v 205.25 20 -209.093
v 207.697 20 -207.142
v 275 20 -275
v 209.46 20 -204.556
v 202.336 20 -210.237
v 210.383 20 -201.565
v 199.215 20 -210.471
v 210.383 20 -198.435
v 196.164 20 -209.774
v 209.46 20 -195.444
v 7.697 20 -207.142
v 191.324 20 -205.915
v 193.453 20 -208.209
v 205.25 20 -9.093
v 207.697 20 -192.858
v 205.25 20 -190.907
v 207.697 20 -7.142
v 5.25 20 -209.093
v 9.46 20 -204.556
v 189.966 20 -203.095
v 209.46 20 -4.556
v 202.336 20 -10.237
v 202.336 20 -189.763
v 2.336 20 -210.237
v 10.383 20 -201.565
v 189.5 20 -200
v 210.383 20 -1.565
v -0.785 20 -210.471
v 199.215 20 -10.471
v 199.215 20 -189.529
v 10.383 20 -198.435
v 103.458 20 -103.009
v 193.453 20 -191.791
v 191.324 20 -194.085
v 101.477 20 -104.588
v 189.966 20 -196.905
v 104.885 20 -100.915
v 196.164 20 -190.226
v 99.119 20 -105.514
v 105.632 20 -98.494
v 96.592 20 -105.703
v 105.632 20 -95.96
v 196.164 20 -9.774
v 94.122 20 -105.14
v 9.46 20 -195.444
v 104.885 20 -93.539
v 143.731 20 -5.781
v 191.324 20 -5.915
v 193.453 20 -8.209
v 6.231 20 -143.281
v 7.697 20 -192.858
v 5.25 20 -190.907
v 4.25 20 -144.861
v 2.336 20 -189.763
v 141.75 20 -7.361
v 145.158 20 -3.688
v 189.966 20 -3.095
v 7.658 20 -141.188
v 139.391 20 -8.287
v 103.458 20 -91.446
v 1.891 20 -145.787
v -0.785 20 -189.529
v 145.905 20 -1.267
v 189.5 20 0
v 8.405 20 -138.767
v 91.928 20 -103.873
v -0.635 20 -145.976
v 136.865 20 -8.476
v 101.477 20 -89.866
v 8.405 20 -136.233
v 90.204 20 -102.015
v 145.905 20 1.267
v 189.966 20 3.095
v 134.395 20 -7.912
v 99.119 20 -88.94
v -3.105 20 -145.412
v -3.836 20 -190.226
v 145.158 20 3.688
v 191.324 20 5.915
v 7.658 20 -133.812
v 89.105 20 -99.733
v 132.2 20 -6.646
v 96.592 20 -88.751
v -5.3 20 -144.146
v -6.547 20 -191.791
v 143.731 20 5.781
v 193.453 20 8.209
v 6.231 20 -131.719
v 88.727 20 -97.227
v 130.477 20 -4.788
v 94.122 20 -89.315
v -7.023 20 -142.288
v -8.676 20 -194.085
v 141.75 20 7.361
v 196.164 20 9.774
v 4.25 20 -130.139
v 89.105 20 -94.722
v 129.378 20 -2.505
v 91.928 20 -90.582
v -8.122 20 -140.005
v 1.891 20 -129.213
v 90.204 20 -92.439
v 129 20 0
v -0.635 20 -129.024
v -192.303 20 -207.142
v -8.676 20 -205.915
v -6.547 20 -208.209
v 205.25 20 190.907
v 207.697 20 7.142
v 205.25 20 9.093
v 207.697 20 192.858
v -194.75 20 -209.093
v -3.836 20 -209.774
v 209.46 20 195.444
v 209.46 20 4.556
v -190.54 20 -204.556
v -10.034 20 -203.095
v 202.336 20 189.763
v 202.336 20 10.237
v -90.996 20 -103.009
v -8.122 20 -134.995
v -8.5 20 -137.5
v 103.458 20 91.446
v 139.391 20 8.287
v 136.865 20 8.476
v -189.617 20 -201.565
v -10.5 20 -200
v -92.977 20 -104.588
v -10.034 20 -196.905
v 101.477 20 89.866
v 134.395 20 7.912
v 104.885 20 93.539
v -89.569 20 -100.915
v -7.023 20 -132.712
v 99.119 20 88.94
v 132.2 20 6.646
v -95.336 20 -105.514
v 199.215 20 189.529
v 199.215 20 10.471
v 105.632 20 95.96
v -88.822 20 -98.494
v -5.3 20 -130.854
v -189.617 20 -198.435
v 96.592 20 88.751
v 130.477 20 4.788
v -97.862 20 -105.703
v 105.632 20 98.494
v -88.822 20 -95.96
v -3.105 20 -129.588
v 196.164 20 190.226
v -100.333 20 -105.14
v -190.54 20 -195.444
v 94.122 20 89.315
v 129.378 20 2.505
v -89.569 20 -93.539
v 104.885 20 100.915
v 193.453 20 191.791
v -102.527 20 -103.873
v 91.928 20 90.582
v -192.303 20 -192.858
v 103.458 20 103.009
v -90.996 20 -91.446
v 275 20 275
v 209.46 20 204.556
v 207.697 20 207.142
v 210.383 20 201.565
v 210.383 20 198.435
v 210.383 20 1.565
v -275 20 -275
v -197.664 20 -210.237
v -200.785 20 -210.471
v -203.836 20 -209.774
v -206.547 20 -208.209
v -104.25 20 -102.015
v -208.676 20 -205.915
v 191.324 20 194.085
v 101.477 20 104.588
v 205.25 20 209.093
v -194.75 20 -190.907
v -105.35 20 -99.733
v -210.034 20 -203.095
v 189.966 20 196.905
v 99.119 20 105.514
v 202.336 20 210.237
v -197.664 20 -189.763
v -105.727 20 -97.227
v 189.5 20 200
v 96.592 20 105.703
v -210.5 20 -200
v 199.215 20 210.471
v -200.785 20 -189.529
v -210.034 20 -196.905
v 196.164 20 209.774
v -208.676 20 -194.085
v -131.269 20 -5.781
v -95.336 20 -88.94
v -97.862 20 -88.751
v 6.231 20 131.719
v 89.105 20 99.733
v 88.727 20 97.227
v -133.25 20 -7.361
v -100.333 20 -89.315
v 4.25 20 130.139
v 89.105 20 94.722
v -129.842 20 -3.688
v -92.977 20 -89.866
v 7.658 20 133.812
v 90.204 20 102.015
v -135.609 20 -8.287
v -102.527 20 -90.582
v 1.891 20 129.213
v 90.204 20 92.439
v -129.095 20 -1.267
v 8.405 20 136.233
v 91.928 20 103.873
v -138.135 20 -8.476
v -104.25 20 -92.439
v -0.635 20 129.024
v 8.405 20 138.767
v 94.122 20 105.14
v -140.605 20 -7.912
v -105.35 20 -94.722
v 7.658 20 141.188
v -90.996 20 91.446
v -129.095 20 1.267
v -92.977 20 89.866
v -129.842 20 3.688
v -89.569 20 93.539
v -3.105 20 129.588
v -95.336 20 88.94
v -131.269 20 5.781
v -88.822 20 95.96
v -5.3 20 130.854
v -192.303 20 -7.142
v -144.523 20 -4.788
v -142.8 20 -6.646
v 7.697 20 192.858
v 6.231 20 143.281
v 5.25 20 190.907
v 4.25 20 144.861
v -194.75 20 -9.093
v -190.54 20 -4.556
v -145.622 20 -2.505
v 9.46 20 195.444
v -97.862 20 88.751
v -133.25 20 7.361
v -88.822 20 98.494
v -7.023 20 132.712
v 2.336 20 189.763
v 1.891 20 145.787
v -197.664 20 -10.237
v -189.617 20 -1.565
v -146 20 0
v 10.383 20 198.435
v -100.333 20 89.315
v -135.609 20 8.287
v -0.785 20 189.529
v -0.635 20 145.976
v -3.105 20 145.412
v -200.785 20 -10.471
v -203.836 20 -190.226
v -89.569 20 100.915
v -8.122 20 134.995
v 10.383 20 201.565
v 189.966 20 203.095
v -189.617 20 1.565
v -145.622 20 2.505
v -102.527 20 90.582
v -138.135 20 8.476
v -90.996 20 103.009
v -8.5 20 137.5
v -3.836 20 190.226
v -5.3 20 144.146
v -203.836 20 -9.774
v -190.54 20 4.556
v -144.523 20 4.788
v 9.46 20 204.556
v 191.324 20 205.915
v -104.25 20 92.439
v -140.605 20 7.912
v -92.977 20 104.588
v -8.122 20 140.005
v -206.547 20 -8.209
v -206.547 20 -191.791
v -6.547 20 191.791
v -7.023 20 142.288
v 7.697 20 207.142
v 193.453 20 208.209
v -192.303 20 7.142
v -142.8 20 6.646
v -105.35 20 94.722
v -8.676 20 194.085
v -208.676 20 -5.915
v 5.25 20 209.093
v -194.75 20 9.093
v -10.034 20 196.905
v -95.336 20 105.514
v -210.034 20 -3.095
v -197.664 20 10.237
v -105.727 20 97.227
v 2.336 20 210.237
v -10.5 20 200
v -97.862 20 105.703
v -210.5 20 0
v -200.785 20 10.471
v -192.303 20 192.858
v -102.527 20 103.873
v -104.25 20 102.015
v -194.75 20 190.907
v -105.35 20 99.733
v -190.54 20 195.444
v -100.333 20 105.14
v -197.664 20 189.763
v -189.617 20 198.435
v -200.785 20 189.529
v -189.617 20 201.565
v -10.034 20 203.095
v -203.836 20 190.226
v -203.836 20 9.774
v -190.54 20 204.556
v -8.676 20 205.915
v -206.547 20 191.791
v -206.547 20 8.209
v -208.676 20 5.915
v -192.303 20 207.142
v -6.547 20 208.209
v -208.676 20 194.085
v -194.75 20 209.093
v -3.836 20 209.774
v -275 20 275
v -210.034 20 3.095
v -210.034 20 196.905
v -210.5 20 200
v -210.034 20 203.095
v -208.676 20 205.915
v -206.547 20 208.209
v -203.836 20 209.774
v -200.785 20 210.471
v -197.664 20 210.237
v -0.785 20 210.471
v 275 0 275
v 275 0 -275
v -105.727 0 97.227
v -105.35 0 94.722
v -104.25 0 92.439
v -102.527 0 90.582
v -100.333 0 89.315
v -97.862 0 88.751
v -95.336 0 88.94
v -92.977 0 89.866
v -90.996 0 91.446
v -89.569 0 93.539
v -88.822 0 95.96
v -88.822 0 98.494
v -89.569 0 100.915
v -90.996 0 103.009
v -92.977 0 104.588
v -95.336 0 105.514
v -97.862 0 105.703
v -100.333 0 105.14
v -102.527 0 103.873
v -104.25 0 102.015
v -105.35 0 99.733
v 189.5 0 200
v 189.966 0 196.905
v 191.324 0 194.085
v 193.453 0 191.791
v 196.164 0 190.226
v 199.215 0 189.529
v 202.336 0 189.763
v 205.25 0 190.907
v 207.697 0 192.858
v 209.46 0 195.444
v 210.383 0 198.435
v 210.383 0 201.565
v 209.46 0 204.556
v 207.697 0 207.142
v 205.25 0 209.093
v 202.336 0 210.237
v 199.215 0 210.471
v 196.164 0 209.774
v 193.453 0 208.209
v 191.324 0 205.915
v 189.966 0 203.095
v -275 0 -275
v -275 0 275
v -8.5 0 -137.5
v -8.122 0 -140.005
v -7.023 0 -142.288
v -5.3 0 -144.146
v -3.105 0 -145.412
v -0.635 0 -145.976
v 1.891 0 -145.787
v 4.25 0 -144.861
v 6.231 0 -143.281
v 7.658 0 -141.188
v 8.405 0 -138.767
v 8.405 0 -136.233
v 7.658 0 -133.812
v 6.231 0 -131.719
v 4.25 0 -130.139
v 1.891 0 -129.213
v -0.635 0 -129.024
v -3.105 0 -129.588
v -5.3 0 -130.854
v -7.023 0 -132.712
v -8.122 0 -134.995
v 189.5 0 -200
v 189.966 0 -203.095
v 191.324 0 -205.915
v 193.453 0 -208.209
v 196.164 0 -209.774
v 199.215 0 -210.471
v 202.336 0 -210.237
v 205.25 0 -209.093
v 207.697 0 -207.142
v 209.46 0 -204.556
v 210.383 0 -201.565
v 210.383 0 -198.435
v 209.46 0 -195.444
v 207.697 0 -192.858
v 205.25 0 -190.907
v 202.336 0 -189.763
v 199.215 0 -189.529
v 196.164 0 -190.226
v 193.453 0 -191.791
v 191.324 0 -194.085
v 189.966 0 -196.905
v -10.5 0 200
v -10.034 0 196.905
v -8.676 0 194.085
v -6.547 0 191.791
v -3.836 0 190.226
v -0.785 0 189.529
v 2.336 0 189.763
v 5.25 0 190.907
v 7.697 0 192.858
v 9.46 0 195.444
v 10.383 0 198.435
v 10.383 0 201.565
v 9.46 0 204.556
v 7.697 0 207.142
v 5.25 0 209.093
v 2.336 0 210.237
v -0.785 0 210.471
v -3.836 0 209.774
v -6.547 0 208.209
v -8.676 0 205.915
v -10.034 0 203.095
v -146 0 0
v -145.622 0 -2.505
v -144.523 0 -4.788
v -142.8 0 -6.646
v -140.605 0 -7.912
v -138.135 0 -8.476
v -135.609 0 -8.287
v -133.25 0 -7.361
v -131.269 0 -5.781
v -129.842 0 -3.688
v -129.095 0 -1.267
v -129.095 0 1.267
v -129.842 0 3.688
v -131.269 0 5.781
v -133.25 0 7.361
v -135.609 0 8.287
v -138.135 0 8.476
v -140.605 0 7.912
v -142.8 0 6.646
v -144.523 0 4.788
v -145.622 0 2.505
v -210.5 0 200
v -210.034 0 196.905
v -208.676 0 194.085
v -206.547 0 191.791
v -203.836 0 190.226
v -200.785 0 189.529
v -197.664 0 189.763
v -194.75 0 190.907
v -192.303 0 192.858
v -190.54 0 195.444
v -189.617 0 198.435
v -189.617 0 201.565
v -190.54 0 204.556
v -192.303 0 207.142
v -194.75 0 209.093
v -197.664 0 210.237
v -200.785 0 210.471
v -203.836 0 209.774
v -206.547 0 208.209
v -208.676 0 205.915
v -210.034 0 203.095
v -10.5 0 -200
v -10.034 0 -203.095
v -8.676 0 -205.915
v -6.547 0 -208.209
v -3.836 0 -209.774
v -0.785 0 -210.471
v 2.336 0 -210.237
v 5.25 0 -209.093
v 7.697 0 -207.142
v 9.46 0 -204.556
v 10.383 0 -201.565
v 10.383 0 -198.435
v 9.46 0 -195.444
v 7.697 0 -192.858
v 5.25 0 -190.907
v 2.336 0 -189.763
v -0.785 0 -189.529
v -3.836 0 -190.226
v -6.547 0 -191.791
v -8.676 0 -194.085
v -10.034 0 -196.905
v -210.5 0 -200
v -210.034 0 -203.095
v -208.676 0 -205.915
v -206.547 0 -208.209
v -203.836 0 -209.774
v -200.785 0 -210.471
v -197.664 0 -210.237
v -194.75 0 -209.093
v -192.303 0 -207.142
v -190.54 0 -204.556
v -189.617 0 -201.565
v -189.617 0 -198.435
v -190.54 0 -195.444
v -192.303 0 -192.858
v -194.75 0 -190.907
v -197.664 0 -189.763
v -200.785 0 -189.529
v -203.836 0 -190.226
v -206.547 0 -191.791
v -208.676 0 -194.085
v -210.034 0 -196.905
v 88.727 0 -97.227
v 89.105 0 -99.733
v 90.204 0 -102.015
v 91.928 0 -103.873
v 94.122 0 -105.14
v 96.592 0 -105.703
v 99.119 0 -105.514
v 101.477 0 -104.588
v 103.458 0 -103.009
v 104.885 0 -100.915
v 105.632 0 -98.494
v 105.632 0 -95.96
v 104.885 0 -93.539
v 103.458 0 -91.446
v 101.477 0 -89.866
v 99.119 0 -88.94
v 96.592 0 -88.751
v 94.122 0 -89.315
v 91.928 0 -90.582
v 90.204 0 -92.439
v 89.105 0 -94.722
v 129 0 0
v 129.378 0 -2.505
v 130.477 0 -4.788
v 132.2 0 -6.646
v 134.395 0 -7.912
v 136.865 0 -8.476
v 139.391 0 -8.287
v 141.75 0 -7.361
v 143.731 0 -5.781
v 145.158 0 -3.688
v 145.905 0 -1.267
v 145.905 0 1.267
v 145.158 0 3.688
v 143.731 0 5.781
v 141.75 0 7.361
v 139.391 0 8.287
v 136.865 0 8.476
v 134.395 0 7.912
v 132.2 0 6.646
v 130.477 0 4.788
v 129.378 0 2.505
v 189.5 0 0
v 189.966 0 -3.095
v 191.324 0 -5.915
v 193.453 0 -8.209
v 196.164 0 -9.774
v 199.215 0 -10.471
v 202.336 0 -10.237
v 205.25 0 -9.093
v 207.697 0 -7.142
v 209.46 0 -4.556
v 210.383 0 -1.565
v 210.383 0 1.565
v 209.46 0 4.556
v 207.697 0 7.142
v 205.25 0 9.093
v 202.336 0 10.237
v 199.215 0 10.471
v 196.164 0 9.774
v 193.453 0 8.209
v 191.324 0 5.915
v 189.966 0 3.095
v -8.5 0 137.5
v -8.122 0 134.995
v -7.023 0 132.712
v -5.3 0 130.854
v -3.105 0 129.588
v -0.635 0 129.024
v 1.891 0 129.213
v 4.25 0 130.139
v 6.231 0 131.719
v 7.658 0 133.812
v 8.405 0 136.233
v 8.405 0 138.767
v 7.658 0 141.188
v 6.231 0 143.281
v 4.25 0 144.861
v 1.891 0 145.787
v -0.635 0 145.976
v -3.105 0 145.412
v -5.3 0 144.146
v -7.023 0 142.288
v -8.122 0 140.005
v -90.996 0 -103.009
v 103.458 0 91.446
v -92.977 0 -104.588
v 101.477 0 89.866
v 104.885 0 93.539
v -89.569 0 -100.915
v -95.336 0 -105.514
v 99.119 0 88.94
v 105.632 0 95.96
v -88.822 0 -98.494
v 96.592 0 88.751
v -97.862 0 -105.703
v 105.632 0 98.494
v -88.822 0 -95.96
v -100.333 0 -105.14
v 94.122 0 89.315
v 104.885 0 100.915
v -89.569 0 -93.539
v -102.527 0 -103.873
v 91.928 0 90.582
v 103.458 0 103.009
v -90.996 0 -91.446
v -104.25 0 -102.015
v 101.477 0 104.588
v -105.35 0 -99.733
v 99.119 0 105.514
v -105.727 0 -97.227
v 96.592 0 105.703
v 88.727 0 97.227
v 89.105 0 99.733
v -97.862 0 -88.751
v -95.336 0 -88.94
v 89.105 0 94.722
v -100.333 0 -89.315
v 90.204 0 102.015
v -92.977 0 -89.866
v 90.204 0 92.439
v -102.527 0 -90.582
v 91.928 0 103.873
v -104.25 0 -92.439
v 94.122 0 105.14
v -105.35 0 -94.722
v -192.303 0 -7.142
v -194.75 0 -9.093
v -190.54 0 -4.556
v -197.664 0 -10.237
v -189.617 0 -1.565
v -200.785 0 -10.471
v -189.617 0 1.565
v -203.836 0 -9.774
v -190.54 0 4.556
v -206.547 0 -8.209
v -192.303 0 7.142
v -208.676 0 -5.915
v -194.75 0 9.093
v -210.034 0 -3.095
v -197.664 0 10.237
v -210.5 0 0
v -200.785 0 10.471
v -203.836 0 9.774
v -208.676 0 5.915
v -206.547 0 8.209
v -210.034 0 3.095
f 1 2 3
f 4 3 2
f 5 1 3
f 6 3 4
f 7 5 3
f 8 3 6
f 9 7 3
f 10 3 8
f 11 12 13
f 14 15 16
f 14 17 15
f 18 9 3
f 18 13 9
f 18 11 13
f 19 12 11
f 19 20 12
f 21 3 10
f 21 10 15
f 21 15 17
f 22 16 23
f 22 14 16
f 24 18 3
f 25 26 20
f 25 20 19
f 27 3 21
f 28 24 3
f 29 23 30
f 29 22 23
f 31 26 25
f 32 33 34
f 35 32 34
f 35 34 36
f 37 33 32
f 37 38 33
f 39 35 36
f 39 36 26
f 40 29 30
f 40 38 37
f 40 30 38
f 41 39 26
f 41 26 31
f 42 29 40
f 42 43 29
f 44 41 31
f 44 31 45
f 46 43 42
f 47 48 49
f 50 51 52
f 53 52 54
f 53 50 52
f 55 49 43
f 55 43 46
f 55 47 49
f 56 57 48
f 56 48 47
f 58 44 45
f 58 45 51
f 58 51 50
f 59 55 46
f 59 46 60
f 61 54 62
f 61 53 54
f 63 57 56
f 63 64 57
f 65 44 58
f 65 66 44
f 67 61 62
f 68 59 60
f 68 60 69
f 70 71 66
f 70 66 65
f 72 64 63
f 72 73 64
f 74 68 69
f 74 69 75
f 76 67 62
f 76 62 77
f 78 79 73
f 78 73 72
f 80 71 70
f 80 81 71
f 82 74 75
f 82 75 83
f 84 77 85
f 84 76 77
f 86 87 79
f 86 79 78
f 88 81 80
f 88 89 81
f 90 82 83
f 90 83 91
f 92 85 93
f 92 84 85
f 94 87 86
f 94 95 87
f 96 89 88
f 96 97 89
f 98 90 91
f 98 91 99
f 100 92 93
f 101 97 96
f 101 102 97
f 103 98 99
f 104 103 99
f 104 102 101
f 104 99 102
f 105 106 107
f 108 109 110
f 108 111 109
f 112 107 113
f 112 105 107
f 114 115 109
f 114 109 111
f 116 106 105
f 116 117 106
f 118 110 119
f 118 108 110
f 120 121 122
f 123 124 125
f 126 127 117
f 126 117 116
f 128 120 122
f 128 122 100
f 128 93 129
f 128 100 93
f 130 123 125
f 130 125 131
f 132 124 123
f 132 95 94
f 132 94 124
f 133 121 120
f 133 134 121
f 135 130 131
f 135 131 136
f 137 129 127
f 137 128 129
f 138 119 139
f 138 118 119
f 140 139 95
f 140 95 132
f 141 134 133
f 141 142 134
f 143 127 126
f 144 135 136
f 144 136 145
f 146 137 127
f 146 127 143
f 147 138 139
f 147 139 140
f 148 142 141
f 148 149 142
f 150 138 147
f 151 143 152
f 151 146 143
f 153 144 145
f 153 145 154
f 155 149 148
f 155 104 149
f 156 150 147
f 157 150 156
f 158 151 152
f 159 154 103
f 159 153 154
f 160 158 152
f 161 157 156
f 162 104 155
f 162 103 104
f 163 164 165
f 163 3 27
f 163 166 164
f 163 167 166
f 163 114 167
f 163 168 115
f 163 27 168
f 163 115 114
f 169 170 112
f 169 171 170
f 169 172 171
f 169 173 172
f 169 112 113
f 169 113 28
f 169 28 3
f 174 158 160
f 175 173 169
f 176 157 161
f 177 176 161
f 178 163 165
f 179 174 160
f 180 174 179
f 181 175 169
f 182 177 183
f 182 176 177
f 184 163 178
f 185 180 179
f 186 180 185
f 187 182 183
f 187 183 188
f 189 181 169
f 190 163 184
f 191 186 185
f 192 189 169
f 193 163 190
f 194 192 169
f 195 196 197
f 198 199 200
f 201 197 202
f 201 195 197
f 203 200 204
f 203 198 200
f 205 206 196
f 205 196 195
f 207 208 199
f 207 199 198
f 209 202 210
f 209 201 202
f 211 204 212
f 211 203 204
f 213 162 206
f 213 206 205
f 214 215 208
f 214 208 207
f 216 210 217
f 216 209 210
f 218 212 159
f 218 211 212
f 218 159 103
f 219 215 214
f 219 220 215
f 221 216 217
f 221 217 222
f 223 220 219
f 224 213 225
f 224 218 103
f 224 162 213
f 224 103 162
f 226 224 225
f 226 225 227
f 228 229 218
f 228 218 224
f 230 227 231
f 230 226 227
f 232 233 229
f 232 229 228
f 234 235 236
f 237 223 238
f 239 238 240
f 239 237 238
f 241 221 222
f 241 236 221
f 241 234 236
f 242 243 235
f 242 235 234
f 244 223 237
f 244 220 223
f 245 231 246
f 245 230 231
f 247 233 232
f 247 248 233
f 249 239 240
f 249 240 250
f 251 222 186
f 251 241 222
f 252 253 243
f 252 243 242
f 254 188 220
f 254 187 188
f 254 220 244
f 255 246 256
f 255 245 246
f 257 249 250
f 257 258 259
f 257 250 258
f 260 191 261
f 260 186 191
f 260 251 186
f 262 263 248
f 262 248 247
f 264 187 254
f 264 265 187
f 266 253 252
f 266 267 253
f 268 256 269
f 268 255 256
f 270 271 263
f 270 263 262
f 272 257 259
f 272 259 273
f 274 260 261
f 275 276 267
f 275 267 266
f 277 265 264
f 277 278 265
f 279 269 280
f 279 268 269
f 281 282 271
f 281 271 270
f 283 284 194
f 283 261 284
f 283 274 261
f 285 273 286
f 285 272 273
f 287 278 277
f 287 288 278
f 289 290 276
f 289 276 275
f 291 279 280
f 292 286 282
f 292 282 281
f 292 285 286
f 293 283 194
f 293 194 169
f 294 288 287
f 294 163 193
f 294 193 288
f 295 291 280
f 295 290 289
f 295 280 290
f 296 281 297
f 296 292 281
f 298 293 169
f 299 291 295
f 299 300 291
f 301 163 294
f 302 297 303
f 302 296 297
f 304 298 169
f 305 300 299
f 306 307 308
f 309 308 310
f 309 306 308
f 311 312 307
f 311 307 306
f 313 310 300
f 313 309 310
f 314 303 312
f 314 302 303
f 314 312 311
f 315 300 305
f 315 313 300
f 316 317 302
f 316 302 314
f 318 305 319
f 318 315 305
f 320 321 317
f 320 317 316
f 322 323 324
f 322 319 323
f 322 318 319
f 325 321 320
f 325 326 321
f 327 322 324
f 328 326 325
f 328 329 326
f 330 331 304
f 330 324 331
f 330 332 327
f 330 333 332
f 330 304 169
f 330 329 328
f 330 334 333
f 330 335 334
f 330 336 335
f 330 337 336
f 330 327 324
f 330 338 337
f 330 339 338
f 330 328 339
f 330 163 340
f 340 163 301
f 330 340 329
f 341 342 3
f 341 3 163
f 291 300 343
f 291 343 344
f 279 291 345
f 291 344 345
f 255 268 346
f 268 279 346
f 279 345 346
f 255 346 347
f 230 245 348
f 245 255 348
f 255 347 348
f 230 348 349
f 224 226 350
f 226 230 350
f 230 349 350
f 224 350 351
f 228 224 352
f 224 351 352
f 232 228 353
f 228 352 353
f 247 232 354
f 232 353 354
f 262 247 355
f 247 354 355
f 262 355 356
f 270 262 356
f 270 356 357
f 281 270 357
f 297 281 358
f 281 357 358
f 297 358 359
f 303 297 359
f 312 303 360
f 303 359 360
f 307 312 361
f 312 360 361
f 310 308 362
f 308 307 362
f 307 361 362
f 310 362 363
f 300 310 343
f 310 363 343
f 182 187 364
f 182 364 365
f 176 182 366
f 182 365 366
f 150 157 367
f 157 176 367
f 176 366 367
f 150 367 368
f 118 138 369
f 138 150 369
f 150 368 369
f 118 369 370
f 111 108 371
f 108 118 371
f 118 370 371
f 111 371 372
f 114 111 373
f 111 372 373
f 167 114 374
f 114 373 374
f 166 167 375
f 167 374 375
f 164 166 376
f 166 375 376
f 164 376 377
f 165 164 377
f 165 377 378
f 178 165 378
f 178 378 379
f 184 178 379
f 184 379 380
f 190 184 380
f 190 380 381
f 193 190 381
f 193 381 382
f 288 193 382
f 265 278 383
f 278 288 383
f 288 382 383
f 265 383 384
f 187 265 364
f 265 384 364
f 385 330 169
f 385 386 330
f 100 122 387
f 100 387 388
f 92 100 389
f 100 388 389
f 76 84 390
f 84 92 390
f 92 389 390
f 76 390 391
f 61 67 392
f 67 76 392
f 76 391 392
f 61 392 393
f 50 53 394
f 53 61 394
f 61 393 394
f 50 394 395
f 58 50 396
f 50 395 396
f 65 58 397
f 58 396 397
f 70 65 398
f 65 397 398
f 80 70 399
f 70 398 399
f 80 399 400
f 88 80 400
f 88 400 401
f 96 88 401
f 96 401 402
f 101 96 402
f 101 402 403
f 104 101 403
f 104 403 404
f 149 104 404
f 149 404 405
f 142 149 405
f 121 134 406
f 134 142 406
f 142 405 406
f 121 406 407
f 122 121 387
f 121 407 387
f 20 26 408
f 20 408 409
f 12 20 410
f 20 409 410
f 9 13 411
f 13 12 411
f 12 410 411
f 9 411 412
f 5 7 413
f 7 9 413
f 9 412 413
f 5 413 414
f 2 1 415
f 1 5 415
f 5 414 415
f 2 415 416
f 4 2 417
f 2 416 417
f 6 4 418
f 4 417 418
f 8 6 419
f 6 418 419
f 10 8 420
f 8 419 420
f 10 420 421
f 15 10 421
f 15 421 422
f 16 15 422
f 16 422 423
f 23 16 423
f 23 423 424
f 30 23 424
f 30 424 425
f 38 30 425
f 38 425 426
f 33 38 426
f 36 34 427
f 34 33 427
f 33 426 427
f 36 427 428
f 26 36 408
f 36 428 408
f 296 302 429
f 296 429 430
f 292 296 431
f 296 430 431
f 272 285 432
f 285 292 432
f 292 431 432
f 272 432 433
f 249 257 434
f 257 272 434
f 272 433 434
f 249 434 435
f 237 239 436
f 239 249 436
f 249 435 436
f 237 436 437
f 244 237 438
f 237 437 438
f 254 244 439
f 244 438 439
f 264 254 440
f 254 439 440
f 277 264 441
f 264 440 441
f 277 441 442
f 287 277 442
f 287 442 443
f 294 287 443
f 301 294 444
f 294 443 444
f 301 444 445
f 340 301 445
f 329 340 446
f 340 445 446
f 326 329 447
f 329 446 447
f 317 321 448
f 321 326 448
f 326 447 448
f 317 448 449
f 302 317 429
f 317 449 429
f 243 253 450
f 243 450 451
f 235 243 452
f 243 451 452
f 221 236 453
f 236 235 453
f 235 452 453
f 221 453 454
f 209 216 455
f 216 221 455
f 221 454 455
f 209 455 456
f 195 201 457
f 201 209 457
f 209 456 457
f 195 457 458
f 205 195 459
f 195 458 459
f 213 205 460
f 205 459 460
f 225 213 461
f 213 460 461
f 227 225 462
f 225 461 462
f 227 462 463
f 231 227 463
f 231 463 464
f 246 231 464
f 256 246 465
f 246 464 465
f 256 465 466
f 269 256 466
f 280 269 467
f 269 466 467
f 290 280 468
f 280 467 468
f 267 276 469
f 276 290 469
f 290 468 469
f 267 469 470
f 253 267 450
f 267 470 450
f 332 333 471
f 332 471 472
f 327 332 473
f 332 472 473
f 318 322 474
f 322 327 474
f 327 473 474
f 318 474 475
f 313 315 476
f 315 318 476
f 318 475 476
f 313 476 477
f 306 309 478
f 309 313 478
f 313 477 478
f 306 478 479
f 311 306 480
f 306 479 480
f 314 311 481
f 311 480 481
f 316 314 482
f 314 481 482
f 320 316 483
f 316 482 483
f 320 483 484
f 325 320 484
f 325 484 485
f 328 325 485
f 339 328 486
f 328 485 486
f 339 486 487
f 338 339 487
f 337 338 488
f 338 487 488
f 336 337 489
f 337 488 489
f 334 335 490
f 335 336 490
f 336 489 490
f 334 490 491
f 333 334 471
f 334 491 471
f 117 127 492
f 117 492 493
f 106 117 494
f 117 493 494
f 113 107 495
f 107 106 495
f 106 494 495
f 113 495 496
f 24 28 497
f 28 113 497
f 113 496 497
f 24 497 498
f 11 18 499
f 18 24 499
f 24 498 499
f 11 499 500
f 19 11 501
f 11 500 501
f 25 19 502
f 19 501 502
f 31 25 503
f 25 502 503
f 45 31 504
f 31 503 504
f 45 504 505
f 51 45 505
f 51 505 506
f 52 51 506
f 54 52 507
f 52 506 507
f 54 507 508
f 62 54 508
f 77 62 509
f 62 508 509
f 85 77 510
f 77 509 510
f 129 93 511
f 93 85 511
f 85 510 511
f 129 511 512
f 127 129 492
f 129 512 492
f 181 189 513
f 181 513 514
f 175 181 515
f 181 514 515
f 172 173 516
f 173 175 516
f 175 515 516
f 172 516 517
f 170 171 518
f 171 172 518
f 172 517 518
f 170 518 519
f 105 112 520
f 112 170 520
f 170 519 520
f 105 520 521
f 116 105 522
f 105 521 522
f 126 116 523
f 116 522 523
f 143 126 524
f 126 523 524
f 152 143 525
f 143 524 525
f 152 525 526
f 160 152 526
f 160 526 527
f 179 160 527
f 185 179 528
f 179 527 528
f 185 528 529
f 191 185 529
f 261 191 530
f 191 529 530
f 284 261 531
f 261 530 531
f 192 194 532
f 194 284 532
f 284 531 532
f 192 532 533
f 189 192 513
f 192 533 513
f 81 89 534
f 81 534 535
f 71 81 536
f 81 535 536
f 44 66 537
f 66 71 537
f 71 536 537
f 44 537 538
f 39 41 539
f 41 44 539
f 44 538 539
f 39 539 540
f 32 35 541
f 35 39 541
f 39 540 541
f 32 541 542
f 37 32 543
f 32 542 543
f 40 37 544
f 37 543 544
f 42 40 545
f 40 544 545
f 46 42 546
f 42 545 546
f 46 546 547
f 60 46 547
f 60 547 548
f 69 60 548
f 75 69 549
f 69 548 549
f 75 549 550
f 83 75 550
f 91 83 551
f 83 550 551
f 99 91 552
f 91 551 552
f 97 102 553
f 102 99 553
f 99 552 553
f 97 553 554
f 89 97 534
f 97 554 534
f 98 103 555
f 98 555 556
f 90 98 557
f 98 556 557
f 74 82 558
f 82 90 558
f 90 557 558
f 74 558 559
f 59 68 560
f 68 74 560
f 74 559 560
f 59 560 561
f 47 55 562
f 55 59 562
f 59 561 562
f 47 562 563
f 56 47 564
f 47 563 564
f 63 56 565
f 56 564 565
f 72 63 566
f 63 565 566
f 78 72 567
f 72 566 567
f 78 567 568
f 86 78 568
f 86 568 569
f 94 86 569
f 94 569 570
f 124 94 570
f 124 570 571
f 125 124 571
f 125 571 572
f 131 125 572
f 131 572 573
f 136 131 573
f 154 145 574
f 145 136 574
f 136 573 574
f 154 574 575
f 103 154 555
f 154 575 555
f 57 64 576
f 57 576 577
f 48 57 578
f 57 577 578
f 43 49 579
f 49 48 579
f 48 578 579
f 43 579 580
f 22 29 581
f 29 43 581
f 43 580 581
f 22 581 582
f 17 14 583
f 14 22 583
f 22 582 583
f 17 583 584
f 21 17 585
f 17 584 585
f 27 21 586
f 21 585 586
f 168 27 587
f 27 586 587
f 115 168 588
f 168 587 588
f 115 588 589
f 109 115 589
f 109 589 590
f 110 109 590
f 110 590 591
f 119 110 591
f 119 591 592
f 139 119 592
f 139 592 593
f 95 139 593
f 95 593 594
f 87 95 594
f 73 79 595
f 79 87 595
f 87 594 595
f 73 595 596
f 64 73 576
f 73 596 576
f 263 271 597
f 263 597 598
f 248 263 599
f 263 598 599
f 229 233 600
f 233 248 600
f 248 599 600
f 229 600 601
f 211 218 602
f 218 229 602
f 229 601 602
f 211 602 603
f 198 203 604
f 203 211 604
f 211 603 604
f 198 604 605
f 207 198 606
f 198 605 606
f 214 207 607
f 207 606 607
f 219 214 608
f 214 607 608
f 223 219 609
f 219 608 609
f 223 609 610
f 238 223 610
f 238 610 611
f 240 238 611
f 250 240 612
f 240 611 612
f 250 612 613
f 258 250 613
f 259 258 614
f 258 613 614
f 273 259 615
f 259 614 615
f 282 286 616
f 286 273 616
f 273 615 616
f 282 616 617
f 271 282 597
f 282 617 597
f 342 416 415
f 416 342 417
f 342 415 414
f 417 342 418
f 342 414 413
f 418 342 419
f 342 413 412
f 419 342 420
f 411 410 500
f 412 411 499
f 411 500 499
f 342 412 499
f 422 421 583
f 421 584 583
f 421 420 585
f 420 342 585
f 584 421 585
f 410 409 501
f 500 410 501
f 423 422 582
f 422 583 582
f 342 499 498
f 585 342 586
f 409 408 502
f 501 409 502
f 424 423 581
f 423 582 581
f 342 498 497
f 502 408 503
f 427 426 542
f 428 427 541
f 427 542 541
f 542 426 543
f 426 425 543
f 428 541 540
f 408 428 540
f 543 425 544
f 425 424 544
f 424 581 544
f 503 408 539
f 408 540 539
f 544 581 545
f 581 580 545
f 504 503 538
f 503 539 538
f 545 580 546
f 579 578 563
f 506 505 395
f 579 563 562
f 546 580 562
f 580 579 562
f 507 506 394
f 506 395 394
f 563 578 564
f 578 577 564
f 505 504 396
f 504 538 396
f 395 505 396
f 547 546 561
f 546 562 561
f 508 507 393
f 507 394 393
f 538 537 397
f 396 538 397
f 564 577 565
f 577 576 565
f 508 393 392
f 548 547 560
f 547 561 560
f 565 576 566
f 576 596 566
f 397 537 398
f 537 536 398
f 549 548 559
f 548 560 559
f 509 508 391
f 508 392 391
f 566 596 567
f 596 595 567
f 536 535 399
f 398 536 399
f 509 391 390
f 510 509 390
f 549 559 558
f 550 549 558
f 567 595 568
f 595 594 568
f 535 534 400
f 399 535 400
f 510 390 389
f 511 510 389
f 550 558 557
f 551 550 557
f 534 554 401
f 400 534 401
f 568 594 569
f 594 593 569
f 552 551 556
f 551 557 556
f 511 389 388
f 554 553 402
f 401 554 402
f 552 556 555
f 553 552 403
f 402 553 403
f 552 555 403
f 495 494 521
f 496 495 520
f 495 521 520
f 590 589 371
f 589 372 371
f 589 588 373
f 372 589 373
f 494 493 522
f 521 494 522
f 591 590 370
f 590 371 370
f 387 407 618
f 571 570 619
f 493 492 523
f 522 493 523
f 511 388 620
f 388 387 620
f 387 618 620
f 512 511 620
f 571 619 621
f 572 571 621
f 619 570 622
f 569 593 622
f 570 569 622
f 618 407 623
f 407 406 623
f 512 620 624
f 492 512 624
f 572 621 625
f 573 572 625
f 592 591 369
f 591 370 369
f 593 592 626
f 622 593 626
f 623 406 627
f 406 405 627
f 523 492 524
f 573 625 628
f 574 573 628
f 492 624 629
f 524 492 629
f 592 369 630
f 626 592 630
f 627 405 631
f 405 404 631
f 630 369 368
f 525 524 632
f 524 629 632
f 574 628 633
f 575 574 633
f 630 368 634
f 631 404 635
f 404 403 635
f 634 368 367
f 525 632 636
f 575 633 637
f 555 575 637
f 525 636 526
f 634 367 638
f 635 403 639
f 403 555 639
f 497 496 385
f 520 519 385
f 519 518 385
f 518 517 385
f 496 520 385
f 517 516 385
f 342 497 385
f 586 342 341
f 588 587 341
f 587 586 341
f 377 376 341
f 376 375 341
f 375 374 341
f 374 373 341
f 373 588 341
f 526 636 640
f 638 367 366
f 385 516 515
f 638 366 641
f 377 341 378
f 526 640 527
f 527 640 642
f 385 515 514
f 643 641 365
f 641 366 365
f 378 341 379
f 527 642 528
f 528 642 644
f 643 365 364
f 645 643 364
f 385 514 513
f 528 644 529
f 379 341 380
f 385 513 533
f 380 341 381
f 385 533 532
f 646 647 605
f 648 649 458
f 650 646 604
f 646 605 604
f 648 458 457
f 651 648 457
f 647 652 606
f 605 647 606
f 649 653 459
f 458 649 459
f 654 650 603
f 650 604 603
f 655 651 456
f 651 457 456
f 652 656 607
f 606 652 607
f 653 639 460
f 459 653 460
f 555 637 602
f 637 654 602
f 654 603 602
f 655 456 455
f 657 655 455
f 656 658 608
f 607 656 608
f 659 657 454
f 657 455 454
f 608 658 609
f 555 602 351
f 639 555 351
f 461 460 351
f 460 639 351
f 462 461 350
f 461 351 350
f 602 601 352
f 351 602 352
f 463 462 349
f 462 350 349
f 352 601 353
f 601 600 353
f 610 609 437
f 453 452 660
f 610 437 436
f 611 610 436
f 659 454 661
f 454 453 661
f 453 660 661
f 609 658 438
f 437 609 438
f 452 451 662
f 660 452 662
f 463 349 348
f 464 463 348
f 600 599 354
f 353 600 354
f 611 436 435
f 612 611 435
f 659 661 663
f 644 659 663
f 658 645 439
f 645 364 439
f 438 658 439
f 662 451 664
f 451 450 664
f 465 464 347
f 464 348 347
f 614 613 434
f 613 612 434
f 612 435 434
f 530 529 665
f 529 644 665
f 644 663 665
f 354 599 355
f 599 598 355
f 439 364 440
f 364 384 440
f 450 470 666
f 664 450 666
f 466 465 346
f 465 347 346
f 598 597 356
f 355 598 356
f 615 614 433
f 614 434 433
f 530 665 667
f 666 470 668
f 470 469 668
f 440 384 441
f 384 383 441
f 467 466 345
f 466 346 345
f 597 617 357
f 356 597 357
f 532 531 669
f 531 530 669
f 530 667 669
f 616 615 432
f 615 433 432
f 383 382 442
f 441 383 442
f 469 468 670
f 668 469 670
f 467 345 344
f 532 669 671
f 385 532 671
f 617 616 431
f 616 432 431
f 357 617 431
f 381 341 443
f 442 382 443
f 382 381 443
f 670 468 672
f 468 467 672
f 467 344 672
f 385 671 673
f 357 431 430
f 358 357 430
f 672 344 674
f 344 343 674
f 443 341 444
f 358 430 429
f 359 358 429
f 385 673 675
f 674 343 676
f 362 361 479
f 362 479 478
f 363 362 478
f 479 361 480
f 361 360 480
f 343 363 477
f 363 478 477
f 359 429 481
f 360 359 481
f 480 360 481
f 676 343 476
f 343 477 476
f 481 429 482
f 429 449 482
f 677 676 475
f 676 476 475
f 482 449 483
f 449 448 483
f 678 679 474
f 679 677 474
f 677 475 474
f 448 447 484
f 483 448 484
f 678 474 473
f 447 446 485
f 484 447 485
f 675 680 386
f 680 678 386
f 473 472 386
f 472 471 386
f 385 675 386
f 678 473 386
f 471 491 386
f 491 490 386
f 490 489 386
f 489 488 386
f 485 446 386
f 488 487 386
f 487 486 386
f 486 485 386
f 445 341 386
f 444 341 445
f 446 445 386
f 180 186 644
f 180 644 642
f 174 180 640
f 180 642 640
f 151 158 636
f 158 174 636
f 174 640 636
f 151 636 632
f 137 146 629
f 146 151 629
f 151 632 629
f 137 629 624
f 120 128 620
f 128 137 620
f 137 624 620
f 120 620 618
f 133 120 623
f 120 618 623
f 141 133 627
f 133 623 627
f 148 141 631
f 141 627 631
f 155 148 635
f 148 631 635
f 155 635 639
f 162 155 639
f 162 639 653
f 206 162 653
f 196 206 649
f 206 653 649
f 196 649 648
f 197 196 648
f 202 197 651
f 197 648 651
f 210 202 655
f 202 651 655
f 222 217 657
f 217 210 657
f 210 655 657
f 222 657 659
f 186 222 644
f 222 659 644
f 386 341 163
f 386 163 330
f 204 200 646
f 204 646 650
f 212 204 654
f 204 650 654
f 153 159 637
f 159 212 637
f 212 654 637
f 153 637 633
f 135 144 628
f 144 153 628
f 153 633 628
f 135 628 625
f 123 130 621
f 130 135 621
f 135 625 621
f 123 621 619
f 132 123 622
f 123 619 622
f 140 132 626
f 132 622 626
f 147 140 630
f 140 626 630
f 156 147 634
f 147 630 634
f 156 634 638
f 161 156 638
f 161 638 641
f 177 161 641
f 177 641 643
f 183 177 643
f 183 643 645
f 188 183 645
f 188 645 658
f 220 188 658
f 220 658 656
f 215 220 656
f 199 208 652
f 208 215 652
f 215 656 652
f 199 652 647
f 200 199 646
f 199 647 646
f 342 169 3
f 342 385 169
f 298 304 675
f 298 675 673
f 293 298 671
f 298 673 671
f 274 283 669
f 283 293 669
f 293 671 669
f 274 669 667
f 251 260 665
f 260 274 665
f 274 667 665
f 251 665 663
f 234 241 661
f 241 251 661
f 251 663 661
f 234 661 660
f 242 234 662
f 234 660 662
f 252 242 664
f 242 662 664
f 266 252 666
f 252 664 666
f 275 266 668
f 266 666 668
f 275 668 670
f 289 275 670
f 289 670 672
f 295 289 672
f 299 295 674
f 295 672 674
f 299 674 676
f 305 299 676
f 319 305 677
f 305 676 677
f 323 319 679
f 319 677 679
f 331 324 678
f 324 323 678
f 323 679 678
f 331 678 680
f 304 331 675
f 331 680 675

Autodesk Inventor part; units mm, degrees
ref_plane "YZ Plane" through (0, 0, 0) normal (1, 0, 0) x (0, 1, 0)
ref_plane "XZ Plane" through (0, 0, 0) normal (0, 1, 0) x (-1, 0, 0)
ref_plane "XY Plane" through (0, 0, 0) normal (0, 0, 1) x (1, 0, 0)
sketch "Эскиз1" plane through (0, 0, 0) normal (0, 1, 0) x (-1, 0, 0)
  line L0 (-275, 275) -> (275, 275)
  line L1 (275, 275) -> (275, -275)
  line L2 (275, -275) -> (-275, -275)
  line L3 (-275, -275) -> (-275, 275)
  line L4 (-275, 275) -> (275, -275) construction
  line L5 (275, 275) -> (-275, -275) construction
  circle A0 centre (200, -200) radius 10.5
  circle A1 centre (200, 0) radius 10.5
  circle A2 centre (200, 200) radius 10.5
  circle A3 centre (0, 200) radius 10.5
  circle A4 centre (-200, 200) radius 10.5
  circle A5 centre (-200, 0) radius 10.5
  circle A6 centre (-200, -200) radius 10.5
  circle A7 centre (0, -200) radius 10.5
  circle A8 centre (0, 0) radius 137.5 construction
  circle A9 centre (0, -137.5) radius 8.5
  circle A10 centre (97.2272, -97.2272) radius 8.5
  circle A11 centre (137.5, 0) radius 8.5
  circle A12 centre (97.2272, 97.2272) radius 8.5
  circle A13 centre (0, 137.5) radius 8.5
  circle A14 centre (-97.2272, 97.2272) radius 8.5
  circle A15 centre (-137.5, 0) radius 8.5
  circle A16 centre (-97.2272, -97.2272) radius 8.5
  dimension "d7" = 275
  dimension "d0" = 550
  dimension "d1" = 550
  dimension "d2" = 75
  dimension "d3" = 75
  dimension "d4" = 75
  dimension "d5" = 75
  dimension "d6" = 21
  dimension "d8" = 17
  dimension "d11" = 360
extrude "Пластина1" add sketch "Эскиз1" along normal blind 20
equation "\"d13\" = Толщина"
equation "\"Толщина\" = 20"
properties part number "Lift.02.00.00.06" material "Сталь нержавеющая, 440C"
